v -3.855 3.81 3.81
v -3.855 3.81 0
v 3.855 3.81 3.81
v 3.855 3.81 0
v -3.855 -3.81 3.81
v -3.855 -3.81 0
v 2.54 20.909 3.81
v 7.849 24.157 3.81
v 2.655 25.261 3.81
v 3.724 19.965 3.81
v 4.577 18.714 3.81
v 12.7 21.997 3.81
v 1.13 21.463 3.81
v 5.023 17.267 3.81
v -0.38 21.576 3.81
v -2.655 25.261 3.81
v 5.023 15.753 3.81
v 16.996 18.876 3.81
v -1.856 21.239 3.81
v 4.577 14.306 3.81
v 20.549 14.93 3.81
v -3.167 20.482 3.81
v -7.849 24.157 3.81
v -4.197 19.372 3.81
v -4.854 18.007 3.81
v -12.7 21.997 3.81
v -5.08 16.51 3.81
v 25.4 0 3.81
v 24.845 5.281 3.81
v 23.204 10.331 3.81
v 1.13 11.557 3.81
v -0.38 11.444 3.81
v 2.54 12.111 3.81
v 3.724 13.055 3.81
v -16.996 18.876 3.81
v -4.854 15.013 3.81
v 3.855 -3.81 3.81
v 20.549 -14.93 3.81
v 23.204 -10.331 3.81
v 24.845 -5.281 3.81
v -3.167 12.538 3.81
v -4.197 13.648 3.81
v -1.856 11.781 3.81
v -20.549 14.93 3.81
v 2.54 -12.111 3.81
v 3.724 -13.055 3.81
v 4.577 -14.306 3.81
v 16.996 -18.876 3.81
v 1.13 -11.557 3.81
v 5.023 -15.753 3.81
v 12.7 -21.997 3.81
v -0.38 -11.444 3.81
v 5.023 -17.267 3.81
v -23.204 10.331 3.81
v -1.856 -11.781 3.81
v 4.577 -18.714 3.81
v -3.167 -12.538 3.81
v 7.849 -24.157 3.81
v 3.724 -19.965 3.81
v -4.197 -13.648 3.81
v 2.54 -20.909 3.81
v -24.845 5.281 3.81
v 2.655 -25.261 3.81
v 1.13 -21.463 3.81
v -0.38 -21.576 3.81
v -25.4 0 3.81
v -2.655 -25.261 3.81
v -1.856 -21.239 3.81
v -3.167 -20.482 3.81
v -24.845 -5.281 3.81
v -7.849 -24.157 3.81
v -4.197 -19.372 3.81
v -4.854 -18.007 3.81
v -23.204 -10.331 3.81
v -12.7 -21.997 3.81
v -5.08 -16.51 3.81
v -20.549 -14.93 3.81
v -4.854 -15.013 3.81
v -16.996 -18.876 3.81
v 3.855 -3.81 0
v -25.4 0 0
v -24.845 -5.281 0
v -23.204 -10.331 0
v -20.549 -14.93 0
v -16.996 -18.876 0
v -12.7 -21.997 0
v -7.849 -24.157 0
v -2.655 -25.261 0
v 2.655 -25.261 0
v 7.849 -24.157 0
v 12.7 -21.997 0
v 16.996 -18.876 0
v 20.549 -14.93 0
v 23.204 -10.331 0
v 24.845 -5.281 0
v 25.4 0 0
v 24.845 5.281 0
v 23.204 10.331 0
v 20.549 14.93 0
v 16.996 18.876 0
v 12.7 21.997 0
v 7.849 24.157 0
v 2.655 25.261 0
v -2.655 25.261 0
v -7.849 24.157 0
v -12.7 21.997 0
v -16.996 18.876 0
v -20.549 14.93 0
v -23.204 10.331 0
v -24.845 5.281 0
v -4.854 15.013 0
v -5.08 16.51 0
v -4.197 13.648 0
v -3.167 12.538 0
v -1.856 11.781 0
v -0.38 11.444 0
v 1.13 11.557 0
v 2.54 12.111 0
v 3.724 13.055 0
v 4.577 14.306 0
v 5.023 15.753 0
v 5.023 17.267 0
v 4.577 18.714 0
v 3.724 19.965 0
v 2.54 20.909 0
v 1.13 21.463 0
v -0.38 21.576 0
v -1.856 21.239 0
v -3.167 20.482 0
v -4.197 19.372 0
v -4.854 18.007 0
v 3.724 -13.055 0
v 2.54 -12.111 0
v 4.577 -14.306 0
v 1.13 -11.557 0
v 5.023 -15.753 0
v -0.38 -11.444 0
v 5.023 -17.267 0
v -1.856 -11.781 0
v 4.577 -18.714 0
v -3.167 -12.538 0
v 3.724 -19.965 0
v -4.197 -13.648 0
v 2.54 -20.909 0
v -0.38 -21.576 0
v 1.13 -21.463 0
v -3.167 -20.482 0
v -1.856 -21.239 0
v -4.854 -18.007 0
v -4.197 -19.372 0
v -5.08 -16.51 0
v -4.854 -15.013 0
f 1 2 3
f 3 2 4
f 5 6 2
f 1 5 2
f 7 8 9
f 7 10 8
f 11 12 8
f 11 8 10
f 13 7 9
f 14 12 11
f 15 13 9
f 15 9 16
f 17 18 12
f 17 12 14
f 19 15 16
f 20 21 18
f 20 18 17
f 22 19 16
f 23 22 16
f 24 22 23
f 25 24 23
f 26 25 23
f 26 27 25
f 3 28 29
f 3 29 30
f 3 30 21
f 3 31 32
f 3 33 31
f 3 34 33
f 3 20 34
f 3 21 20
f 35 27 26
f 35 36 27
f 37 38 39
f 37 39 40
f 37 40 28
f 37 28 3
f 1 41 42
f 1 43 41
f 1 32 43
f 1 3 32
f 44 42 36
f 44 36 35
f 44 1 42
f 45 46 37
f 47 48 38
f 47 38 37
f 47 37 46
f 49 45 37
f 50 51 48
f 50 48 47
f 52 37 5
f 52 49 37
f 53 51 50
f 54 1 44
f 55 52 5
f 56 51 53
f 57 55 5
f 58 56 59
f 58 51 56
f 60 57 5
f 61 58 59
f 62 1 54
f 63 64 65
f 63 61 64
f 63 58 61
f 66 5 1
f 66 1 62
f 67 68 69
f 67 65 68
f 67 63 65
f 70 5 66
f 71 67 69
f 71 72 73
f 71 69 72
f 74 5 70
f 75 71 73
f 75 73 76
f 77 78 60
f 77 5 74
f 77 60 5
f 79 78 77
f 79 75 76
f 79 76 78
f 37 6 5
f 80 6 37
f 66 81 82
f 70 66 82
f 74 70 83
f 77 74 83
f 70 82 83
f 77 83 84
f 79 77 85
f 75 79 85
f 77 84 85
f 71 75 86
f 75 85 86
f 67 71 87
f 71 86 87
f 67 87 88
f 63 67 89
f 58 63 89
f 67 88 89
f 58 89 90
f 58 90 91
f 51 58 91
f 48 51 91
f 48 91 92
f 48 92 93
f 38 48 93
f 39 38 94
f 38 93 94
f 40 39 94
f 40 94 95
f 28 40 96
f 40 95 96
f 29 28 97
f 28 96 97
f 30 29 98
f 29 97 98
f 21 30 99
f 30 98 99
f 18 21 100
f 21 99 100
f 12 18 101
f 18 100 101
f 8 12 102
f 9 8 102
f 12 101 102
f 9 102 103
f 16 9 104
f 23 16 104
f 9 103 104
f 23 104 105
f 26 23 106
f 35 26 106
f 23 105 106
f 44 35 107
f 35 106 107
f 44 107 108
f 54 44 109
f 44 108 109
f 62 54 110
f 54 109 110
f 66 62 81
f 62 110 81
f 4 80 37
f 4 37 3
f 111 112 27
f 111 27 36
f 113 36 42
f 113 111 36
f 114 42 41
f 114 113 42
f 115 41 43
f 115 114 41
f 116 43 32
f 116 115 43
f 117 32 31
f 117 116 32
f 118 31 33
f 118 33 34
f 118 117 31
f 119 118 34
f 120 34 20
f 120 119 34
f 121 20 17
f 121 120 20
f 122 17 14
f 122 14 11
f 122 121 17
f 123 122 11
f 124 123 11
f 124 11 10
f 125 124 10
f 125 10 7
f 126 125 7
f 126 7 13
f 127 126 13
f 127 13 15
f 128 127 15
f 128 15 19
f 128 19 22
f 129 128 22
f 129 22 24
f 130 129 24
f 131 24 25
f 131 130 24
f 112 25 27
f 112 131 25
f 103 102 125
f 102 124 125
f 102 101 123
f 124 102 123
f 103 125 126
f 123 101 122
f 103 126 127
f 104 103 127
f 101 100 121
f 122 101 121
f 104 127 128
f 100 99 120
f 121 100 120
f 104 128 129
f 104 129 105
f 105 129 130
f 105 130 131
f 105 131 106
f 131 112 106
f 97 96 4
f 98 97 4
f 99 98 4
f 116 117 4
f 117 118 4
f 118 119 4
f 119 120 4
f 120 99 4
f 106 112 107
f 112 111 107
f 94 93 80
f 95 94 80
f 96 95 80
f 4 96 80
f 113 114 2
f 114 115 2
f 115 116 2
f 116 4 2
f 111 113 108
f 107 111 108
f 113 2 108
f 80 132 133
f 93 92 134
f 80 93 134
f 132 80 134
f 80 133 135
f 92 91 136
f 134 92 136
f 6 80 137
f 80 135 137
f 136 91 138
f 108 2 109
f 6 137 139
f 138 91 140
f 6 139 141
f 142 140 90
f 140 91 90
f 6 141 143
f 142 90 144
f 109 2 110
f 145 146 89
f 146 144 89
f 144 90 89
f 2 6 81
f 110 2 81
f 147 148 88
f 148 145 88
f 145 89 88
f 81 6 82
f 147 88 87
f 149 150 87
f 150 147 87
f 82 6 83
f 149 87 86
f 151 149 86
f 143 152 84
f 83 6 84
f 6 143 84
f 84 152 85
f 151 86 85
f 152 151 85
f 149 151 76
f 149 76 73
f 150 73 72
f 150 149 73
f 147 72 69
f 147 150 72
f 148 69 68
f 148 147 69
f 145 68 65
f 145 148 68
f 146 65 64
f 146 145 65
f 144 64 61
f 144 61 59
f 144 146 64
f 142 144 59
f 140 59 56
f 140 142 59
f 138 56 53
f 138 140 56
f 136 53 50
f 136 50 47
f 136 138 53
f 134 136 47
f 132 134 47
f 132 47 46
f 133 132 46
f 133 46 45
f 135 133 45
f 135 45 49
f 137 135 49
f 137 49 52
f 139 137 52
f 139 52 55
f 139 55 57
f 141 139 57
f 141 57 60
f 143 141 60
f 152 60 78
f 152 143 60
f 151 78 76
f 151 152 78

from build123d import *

# Parameters (mm, degrees)
SKETCH1_R           = 25.4
SKETCH1_R_2         = 5.08
SKETCH1_W           = 7.710600268
SKETCH1_H           = 7.62
BOSS_EXTRUDE1_DEPTH = 3.81


with BuildPart() as part:
    # Sketch1 → Boss-Extrude1 (new body)
    with BuildSketch(Plane.XY):
        with Locations(Location((0, 0, 0), (0, 0, 180))):
            Circle(SKETCH1_R)
        with Locations(Location((0, 16.51, 0), (0, 0, 180))):
            Circle(SKETCH1_R_2, mode=Mode.SUBTRACT)
        with Locations(Location((0, -16.51, 0), (0, 0, 180))):
            Circle(SKETCH1_R_2, mode=Mode.SUBTRACT)
        Rectangle(SKETCH1_W, SKETCH1_H, mode=Mode.SUBTRACT)
    extrude(amount=BOSS_EXTRUDE1_DEPTH)


solid = part.part
